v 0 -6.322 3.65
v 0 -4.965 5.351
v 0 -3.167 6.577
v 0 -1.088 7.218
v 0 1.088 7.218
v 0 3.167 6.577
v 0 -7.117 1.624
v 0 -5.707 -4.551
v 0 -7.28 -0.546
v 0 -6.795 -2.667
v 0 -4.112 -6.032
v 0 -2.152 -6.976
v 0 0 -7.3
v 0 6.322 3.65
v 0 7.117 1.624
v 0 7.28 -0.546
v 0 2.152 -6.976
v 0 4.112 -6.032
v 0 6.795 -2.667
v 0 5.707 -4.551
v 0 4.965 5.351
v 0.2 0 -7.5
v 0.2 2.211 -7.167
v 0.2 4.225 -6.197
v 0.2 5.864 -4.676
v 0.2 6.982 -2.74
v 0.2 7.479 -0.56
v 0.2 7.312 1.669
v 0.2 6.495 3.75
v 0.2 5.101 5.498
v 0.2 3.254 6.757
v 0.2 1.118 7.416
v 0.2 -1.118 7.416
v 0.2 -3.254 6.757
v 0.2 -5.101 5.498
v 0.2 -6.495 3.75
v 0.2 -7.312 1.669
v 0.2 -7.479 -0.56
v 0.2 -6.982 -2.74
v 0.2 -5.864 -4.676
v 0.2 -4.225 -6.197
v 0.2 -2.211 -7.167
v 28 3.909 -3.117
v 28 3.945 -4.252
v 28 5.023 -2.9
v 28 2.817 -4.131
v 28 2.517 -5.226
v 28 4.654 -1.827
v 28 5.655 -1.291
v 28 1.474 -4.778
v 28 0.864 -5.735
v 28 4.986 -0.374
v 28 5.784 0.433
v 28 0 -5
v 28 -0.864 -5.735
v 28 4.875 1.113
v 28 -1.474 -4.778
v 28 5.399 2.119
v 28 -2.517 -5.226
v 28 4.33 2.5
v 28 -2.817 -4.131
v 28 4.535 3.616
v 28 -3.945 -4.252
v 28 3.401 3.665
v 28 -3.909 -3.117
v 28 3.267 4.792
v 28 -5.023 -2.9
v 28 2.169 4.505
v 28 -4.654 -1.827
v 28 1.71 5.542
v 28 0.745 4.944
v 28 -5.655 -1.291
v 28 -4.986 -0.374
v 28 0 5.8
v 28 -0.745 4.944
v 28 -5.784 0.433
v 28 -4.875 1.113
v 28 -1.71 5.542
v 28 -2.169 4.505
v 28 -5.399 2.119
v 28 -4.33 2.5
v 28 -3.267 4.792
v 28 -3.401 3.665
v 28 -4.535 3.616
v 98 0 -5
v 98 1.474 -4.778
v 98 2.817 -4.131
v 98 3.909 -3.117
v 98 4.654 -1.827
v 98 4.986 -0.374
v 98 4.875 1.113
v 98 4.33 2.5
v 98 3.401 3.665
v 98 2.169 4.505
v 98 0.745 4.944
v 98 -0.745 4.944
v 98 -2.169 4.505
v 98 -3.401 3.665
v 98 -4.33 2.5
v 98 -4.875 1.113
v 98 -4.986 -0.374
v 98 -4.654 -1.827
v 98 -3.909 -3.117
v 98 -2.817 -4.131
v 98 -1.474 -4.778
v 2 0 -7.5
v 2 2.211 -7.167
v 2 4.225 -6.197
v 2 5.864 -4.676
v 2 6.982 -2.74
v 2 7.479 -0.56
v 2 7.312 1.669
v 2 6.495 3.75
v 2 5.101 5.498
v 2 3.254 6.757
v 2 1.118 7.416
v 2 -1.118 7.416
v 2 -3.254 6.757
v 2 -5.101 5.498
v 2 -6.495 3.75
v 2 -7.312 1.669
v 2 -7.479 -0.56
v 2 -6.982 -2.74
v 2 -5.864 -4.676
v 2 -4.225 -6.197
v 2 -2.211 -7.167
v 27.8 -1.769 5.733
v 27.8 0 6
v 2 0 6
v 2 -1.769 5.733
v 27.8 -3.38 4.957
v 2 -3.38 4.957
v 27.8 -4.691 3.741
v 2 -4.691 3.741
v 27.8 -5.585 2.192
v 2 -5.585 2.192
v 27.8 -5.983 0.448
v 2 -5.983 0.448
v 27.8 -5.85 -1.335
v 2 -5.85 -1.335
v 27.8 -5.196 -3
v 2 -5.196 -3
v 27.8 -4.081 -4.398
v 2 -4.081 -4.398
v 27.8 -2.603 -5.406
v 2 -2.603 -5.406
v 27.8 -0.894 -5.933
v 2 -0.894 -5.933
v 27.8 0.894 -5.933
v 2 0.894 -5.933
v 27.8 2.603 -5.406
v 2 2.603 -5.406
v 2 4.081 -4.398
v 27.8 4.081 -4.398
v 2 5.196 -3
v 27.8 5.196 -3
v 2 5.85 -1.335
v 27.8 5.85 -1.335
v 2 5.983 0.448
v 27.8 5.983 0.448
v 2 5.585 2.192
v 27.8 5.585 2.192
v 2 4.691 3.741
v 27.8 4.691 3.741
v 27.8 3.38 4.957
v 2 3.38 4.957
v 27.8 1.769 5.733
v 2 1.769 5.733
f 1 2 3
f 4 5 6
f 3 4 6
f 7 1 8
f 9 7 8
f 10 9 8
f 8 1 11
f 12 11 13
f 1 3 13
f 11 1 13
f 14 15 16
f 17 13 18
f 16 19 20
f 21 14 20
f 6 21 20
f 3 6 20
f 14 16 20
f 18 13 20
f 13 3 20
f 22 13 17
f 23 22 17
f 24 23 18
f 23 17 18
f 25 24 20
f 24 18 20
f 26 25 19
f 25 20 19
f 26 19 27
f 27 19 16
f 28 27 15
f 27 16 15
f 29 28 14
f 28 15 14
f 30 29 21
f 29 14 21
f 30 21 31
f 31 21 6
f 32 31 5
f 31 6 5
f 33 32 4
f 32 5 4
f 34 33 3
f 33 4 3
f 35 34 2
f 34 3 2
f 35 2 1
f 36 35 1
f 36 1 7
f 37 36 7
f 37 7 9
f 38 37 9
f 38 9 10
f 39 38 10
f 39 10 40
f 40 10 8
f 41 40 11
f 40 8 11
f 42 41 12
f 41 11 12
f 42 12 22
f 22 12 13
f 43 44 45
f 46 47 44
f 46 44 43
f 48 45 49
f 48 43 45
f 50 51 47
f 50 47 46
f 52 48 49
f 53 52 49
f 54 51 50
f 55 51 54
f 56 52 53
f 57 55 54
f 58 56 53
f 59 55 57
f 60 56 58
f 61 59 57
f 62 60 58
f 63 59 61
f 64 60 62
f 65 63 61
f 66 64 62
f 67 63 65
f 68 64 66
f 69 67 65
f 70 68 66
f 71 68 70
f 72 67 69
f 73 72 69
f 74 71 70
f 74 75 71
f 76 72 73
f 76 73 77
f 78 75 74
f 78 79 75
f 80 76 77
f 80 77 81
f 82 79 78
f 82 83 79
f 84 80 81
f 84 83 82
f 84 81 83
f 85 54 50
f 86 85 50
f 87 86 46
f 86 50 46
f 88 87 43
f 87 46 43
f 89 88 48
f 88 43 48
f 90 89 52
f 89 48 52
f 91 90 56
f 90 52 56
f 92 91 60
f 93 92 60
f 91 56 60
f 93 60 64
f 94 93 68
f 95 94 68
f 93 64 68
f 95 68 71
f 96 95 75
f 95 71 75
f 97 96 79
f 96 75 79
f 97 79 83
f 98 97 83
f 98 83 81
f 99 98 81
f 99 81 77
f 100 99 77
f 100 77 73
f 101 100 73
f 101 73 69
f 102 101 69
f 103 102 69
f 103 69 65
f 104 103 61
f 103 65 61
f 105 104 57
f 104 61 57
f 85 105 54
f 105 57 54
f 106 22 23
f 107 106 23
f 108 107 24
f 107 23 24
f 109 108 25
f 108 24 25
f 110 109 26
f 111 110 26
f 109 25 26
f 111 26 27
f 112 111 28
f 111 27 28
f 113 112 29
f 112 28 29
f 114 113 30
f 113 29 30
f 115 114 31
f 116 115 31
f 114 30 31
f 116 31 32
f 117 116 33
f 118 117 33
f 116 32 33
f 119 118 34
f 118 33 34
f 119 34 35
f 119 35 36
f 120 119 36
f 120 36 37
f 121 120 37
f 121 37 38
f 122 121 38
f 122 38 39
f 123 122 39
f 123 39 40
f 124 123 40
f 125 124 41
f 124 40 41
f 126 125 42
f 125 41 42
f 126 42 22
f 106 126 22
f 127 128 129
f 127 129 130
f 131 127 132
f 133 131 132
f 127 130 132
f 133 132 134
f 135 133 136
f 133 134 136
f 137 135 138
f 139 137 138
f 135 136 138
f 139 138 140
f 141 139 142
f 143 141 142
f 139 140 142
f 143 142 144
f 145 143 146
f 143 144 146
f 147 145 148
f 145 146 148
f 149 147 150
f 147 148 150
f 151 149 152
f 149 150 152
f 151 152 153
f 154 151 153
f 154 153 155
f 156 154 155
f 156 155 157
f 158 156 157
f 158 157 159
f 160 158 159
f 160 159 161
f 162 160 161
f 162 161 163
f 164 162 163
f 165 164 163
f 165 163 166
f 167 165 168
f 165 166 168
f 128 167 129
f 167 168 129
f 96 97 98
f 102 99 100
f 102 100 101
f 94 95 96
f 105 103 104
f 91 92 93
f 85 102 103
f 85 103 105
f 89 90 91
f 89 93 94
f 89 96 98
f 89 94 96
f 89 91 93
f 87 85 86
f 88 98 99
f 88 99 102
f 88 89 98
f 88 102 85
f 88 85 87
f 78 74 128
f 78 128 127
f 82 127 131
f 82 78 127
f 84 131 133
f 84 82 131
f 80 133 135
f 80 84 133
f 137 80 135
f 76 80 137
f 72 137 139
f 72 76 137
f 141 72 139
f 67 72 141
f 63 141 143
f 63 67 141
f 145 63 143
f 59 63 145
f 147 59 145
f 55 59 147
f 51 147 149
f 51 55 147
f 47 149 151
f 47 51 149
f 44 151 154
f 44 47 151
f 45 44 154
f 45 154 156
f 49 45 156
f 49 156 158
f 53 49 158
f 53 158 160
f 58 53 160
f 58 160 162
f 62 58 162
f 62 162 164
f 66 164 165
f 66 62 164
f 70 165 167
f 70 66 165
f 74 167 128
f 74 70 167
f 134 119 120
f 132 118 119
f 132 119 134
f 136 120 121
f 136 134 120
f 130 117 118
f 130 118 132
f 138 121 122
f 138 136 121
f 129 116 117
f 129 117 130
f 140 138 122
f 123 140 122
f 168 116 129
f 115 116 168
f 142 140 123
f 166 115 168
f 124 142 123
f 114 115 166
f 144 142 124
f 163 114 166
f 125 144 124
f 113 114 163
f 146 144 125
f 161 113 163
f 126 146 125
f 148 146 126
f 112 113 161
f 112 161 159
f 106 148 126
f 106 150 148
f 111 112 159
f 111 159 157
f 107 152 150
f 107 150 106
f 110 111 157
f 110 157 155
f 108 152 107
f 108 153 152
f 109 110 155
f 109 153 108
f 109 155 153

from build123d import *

# Parameters (mm, degrees)
SKETCH1_R           = 7.5
BOSS_EXTRUDE1_DEPTH = 2
SKETCH2_R           = 6
BOSS_EXTRUDE2_DEPTH = 26
SKETCH3_R           = 5
BOSS_EXTRUDE3_DEPTH = 70
CHAMFER1_SIZE       = 0.2


with BuildPart() as part:
    # Sketch1 → Boss-Extrude1 (new body)
    with BuildSketch(Plane(origin=(0, 0, 0), x_dir=(0, 0, -1), z_dir=(1, 0, 0))):
        Circle(SKETCH1_R)
    extrude(amount=BOSS_EXTRUDE1_DEPTH)

    # Sketch2 → Boss-Extrude2 (add)
    with BuildSketch(Plane(origin=(2, 0, 0), x_dir=(0, 0, -1), z_dir=(1, 0, 0))):
        with Locations(Location((0, 0, 0), (0, 0, 180))):
            Circle(SKETCH2_R)
    extrude(amount=BOSS_EXTRUDE2_DEPTH)

    # Sketch3 → Boss-Extrude3 (add)
    with BuildSketch(Plane(origin=(28, 0, 0), x_dir=(0, 0, -1), z_dir=(1, 0, 0))):
        Circle(SKETCH3_R)
    extrude(amount=BOSS_EXTRUDE3_DEPTH)

    # Chamfer1
    chamfer1_edges = [part.edges().sort_by_distance(p)[0] for p in [
        (0, 0, 7.5),
        (28, 0, -6),
    ]]
    chamfer(chamfer1_edges, length=CHAMFER1_SIZE)


solid = part.part
